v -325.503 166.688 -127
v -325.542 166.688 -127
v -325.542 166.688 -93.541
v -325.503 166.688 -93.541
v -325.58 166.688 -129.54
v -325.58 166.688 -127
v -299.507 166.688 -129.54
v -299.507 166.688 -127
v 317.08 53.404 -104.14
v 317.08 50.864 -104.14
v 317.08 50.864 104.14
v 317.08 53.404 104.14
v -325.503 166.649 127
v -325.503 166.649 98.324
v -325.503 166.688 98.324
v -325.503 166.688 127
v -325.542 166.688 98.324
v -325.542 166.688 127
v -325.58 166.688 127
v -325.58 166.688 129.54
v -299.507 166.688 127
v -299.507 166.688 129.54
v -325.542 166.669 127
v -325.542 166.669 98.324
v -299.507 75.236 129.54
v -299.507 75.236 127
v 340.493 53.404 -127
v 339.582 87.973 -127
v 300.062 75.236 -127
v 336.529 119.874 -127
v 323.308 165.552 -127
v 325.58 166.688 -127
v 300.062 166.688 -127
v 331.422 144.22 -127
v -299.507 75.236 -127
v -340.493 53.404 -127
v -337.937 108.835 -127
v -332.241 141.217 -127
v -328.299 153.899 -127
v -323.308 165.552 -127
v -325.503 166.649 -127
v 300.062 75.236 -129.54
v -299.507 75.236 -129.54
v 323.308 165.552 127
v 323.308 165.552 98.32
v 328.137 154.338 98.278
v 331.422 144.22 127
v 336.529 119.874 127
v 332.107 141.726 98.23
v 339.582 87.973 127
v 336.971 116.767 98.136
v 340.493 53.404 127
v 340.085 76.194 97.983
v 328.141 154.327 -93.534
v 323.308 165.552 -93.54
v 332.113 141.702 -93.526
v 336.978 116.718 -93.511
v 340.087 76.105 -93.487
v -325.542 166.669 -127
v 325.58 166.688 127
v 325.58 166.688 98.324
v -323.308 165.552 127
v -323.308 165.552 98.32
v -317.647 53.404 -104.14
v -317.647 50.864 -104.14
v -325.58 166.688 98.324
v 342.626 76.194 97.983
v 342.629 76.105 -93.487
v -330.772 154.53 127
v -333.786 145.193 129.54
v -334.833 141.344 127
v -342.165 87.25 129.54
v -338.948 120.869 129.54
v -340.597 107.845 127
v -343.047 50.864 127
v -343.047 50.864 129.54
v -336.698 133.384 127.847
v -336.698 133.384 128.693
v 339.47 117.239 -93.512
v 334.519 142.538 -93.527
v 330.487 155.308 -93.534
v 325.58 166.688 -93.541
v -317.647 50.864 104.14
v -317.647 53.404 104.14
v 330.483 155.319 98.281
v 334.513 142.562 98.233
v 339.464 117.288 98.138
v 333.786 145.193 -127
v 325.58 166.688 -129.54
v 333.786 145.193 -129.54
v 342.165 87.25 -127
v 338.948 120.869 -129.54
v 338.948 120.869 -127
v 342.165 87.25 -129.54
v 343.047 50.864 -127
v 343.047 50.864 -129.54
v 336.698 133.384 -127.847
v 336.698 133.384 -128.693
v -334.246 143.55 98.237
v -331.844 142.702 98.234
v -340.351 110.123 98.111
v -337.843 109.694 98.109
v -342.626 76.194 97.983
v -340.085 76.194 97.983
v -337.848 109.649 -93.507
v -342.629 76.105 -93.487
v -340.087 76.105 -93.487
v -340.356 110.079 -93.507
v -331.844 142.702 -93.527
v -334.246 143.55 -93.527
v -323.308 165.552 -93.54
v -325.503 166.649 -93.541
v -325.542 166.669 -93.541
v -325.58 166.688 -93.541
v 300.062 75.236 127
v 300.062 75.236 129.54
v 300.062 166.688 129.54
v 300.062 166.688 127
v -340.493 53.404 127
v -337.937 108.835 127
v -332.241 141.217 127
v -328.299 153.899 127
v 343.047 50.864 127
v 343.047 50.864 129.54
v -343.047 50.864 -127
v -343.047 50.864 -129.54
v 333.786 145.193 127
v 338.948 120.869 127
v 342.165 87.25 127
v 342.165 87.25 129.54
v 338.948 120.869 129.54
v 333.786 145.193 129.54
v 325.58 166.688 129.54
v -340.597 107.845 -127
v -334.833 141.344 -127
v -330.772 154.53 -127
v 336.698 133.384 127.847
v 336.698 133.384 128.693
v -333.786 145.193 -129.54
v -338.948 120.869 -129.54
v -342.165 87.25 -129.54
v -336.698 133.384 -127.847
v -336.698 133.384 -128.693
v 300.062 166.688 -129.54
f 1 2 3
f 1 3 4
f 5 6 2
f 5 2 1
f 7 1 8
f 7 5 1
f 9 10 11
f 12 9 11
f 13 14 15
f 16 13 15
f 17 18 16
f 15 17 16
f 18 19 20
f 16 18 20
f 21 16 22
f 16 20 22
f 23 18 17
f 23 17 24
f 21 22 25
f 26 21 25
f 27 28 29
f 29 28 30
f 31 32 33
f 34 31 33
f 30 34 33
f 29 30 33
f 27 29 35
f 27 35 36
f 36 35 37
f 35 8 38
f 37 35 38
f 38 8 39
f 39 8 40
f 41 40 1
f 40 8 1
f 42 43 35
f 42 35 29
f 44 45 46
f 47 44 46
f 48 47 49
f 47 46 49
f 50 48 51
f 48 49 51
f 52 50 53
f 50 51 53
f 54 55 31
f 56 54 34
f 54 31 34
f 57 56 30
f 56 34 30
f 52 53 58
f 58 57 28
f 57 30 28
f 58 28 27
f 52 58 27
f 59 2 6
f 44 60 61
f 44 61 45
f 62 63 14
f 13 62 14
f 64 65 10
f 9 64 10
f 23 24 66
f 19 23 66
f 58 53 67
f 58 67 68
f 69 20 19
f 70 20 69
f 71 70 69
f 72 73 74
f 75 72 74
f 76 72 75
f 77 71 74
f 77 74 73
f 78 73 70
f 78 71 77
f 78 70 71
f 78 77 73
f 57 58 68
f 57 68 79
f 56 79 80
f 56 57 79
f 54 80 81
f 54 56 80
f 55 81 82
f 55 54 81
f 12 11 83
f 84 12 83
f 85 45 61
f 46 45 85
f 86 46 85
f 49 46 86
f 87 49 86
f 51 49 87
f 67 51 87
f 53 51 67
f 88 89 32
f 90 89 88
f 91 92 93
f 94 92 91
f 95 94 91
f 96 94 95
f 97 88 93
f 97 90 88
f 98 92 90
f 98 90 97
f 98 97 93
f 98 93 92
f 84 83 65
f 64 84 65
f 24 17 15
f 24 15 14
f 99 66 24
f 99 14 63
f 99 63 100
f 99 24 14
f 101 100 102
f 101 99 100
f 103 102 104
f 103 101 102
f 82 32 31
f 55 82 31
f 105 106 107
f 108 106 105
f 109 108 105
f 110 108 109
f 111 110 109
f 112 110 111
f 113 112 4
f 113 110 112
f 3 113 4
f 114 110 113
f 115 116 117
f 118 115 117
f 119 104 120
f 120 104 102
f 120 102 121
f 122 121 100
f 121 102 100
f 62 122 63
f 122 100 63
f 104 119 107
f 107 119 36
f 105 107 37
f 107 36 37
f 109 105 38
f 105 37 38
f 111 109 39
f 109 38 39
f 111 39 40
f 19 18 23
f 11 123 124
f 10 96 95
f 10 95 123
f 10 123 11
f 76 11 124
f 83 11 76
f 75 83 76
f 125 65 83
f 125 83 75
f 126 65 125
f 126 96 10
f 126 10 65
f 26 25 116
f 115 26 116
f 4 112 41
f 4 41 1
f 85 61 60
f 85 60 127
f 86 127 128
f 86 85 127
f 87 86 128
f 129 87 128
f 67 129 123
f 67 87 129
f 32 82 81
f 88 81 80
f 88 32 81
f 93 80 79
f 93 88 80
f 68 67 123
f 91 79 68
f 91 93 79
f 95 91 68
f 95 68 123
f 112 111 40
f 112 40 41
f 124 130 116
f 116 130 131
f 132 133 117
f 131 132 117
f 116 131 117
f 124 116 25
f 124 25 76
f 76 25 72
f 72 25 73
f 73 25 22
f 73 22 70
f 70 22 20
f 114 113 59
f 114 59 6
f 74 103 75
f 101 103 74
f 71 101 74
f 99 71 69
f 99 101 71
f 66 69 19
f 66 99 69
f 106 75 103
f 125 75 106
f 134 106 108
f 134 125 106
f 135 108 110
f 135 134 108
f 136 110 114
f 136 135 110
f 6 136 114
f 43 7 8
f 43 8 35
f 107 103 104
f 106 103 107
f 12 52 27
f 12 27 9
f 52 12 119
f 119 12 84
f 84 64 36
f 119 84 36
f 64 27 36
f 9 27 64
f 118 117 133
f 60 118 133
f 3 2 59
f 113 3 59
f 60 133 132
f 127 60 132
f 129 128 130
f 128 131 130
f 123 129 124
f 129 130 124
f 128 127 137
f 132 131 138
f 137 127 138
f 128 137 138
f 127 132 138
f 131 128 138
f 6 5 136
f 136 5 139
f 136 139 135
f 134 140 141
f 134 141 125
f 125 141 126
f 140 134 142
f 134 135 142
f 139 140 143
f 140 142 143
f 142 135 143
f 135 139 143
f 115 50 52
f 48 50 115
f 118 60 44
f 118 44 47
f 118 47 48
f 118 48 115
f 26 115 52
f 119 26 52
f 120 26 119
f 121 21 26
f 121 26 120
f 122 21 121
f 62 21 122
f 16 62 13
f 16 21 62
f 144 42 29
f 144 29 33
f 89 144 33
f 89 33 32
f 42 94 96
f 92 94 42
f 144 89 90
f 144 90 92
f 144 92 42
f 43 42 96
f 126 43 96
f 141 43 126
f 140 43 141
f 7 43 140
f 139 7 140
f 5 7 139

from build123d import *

# Parameters (mm, degrees)
EXTRUDE_THIN2_START    = -127
EXTRUDE_THIN2_DEPTH    = 254
SPLIT1_SURFACE_1_BACK  = 741.713
SPLIT1_SURFACE_1_DEPTH = 1483.426
BOSS_EXTRUDE2_DEPTH    = 2.54
BOSS_EXTRUDE3_DEPTH    = 2.54
SPLIT2_SURFACE_2_BACK  = 743.47
SPLIT2_SURFACE_2_DEPTH = 1486.94


# Read off the part's stored shape, not the designer's step: Extrude-Thin2
with BuildPart() as part:
    # Extrude-Thin2 outline → Extrude-Thin2 (new body)
    with BuildSketch(Plane.XY.offset(EXTRUDE_THIN2_START)):
        with BuildLine():
            Line((-325.542449195, 166.687822519), (-325.542449195, 166.669160537))
            Line((-325.542449195, 166.669160537), (-325.579794085, 166.687822519))
            add(Edge.make_bspline(
                [(-343.046678298, 50.863822519), (-342.854742326, 95.850869045), (-340.503085509, 136.824505781), (-325.579794085, 166.687822519)],
                knots=[0.396009693, 0.396009693, 0.396009693, 0.396009693, 0.524743478, 0.524743478, 0.524743478, 0.524743478], degree=3))
            Line((-343.046678298, 50.863822519), (343.046678298, 50.863822519))
            add(Edge.make_bspline(
                [(325.579794084, 166.687822519), (340.503085509, 136.824505781), (342.854742326, 95.850869045), (343.046678298, 50.863822519)],
                knots=[0.396009693, 0.396009693, 0.396009693, 0.396009693, 0.524743478, 0.524743478, 0.524743478, 0.524743478], degree=3))
            Line((325.579794084, 166.687822519), (323.307694442, 165.552409283))
            add(Edge.make_bspline(
                [(323.307694442, 165.552409283), (326.877593275, 158.408608594), (329.727019011, 150.576977672), (334.257221566, 133.733582984), (335.93764666, 124.722865717), (339.652297398, 96.250136339), (340.357498858, 75.350575466), (340.493401884, 53.403822519)],
                knots=[0, 0, 0, 0, 0.25, 0.25, 0.5, 0.5, 1, 1, 1, 1], degree=3))
            Line((340.493401884, 53.403822519), (-340.493401884, 53.403822519))
            add(Edge.make_bspline(
                [(-340.493401884, 53.403822519), (-340.357498858, 75.350575466), (-339.652297398, 96.250136339), (-335.937646661, 124.722865717), (-334.257221567, 133.733582984), (-329.727019012, 150.576977672), (-326.877593276, 158.408608594), (-323.307694443, 165.552409283)],
                knots=[0, 0, 0, 0, 0.5, 0.5, 0.75, 0.75, 1, 1, 1, 1], degree=3))
            Line((-323.307694443, 165.552409283), (-325.502746425, 166.649320276))
            Line((-325.502746425, 166.649320276), (-325.502746425, 166.687822519))
            Line((-325.502746425, 166.687822519), (-325.542449195, 166.687822519))
        make_face()
    extrude(amount=EXTRUDE_THIN2_DEPTH)

    # Split1: cut with a surface, the side behind it stays
    # Split1 surface: a surface, the sketch's curves swept straight by 1483.426 mm
    with BuildLine(Plane(origin=(0, 0, 0), x_dir=(0, 0, -1), z_dir=(1, 0, 0)).offset(-SPLIT1_SURFACE_1_BACK), mode=Mode.PRIVATE) as split1_surface_1_path:
        Line((-98.324088945, 166.687822519), (-97.98299712, 76.193733858))
        Line((-97.98299712, 76.193733858), (93.487324748, 76.104761498))
        Line((93.487324748, 76.104761498), (93.541066072, 166.687822519))
        Line((93.541066072, 166.687822519), (-98.324088945, 166.687822519))
    split1_surface_1 = Shell.extrude(split1_surface_1_path.wire(), (1 * SPLIT1_SURFACE_1_DEPTH, 0 * SPLIT1_SURFACE_1_DEPTH, 0 * SPLIT1_SURFACE_1_DEPTH))
    split(bisect_by=split1_surface_1, keep=Keep.BOTTOM)

    # Sketch6 → Boss-Extrude2 (add)
    with BuildSketch(Plane.XY.offset(129.54)):
        with BuildLine():
            Line((343.046678298, 50.863822519), (-343.046678298, 50.863822519))
            add(Edge.make_bspline(
                [(-325.579794085, 166.687822519), (-340.503085509, 136.824505781), (-342.854742326, 95.850869045), (-343.046678298, 50.863822519)],
                knots=[0.396009693, 0.396009693, 0.396009693, 0.396009693, 0.524743478, 0.524743478, 0.524743478, 0.524743478], degree=3))
            Line((-325.579794085, 166.687822519), (-325.542449195, 166.687822519))
            Line((-325.542449195, 166.687822519), (-299.506767133, 166.687822519))
            Line((-299.506767133, 166.687822519), (-299.506767133, 75.23611572))
            Line((-299.506767133, 75.23611572), (300.062358087, 75.23611572))
            Line((300.062358087, 75.23611572), (300.062358087, 166.687822519))
            Line((300.062358087, 166.687822519), (325.579794084, 166.687822519))
            add(Edge.make_bspline(
                [(325.579794084, 166.687822519), (340.503085509, 136.824505781), (342.854742326, 95.850869045), (343.046678298, 50.863822519)],
                knots=[0.396009693, 0.396009693, 0.396009693, 0.396009693, 0.524743478, 0.524743478, 0.524743478, 0.524743478], degree=3))
        make_face()
    extrude(amount=-BOSS_EXTRUDE2_DEPTH)

    # Sketch7 → Boss-Extrude3 (add)
    with BuildSketch(Plane(origin=(0, 0, -129.54), x_dir=(-1, 0, 0), z_dir=(0, 0, -1))):
        with BuildLine():
            Line((0, 50.863822519), (0, 75.23611572))
            Line((0, 75.23611572), (-300.062358087, 75.23611572))
            Line((-300.062358087, 75.23611572), (-300.062358087, 166.687822519))
            Line((-300.062358087, 166.687822519), (-325.502746425, 166.687822519))
            Line((-325.502746425, 166.687822519), (-325.542449195, 166.687822519))
            Line((-325.542449195, 166.687822519), (-325.579794085, 166.687822519))
            add(Edge.make_bspline(
                [(-325.579794085, 166.687822519), (-340.503085509, 136.824505781), (-342.854742326, 95.850869045), (-343.046678298, 50.863822519)],
                knots=[0.396009693, 0.396009693, 0.396009693, 0.396009693, 0.524743478, 0.524743478, 0.524743478, 0.524743478], degree=3))
            Line((-343.046678298, 50.863822519), (0, 50.863822519))
        make_face()
        with BuildLine():
            Line((299.506767133, 75.23611572), (0, 75.23611572))
            Line((0, 75.23611572), (0, 50.863822519))
            Line((0, 50.863822519), (343.046678298, 50.863822519))
            add(Edge.make_bspline(
                [(325.579794084, 166.687822519), (340.503085509, 136.824505781), (342.854742326, 95.850869045), (343.046678298, 50.863822519)],
                knots=[0.396009693, 0.396009693, 0.396009693, 0.396009693, 0.524743478, 0.524743478, 0.524743478, 0.524743478], degree=3))
            Line((325.579794084, 166.687822519), (299.506767133, 166.687822519))
            Line((299.506767133, 166.687822519), (299.506767133, 75.23611572))
        make_face()
    extrude(amount=-BOSS_EXTRUDE3_DEPTH)

    # Split2: cut with a surface, the side it looks to stays
    # Split2 surface: a surface, the sketch's curves swept straight by 1486.94 mm
    with BuildLine(Plane(origin=(0, 0, 0), x_dir=(1, 0, 0), z_dir=(0, 1, 0)).offset(-SPLIT2_SURFACE_2_BACK), mode=Mode.PRIVATE) as split2_surface_2_path:
        Line((-317.646678298, 104.14), (317.080123639, 104.14))
        Line((317.080123639, 104.14), (317.080123639, -104.14))
        Line((317.080123639, -104.14), (-317.646678298, -104.14))
        Line((-317.646678298, -104.14), (-317.646678298, 104.14))
    split2_surface_2 = Shell.extrude(split2_surface_2_path.wire(), (0 * SPLIT2_SURFACE_2_DEPTH, 1 * SPLIT2_SURFACE_2_DEPTH, 0 * SPLIT2_SURFACE_2_DEPTH))
    split(bisect_by=split2_surface_2, keep=Keep.TOP)


solid = part.part
